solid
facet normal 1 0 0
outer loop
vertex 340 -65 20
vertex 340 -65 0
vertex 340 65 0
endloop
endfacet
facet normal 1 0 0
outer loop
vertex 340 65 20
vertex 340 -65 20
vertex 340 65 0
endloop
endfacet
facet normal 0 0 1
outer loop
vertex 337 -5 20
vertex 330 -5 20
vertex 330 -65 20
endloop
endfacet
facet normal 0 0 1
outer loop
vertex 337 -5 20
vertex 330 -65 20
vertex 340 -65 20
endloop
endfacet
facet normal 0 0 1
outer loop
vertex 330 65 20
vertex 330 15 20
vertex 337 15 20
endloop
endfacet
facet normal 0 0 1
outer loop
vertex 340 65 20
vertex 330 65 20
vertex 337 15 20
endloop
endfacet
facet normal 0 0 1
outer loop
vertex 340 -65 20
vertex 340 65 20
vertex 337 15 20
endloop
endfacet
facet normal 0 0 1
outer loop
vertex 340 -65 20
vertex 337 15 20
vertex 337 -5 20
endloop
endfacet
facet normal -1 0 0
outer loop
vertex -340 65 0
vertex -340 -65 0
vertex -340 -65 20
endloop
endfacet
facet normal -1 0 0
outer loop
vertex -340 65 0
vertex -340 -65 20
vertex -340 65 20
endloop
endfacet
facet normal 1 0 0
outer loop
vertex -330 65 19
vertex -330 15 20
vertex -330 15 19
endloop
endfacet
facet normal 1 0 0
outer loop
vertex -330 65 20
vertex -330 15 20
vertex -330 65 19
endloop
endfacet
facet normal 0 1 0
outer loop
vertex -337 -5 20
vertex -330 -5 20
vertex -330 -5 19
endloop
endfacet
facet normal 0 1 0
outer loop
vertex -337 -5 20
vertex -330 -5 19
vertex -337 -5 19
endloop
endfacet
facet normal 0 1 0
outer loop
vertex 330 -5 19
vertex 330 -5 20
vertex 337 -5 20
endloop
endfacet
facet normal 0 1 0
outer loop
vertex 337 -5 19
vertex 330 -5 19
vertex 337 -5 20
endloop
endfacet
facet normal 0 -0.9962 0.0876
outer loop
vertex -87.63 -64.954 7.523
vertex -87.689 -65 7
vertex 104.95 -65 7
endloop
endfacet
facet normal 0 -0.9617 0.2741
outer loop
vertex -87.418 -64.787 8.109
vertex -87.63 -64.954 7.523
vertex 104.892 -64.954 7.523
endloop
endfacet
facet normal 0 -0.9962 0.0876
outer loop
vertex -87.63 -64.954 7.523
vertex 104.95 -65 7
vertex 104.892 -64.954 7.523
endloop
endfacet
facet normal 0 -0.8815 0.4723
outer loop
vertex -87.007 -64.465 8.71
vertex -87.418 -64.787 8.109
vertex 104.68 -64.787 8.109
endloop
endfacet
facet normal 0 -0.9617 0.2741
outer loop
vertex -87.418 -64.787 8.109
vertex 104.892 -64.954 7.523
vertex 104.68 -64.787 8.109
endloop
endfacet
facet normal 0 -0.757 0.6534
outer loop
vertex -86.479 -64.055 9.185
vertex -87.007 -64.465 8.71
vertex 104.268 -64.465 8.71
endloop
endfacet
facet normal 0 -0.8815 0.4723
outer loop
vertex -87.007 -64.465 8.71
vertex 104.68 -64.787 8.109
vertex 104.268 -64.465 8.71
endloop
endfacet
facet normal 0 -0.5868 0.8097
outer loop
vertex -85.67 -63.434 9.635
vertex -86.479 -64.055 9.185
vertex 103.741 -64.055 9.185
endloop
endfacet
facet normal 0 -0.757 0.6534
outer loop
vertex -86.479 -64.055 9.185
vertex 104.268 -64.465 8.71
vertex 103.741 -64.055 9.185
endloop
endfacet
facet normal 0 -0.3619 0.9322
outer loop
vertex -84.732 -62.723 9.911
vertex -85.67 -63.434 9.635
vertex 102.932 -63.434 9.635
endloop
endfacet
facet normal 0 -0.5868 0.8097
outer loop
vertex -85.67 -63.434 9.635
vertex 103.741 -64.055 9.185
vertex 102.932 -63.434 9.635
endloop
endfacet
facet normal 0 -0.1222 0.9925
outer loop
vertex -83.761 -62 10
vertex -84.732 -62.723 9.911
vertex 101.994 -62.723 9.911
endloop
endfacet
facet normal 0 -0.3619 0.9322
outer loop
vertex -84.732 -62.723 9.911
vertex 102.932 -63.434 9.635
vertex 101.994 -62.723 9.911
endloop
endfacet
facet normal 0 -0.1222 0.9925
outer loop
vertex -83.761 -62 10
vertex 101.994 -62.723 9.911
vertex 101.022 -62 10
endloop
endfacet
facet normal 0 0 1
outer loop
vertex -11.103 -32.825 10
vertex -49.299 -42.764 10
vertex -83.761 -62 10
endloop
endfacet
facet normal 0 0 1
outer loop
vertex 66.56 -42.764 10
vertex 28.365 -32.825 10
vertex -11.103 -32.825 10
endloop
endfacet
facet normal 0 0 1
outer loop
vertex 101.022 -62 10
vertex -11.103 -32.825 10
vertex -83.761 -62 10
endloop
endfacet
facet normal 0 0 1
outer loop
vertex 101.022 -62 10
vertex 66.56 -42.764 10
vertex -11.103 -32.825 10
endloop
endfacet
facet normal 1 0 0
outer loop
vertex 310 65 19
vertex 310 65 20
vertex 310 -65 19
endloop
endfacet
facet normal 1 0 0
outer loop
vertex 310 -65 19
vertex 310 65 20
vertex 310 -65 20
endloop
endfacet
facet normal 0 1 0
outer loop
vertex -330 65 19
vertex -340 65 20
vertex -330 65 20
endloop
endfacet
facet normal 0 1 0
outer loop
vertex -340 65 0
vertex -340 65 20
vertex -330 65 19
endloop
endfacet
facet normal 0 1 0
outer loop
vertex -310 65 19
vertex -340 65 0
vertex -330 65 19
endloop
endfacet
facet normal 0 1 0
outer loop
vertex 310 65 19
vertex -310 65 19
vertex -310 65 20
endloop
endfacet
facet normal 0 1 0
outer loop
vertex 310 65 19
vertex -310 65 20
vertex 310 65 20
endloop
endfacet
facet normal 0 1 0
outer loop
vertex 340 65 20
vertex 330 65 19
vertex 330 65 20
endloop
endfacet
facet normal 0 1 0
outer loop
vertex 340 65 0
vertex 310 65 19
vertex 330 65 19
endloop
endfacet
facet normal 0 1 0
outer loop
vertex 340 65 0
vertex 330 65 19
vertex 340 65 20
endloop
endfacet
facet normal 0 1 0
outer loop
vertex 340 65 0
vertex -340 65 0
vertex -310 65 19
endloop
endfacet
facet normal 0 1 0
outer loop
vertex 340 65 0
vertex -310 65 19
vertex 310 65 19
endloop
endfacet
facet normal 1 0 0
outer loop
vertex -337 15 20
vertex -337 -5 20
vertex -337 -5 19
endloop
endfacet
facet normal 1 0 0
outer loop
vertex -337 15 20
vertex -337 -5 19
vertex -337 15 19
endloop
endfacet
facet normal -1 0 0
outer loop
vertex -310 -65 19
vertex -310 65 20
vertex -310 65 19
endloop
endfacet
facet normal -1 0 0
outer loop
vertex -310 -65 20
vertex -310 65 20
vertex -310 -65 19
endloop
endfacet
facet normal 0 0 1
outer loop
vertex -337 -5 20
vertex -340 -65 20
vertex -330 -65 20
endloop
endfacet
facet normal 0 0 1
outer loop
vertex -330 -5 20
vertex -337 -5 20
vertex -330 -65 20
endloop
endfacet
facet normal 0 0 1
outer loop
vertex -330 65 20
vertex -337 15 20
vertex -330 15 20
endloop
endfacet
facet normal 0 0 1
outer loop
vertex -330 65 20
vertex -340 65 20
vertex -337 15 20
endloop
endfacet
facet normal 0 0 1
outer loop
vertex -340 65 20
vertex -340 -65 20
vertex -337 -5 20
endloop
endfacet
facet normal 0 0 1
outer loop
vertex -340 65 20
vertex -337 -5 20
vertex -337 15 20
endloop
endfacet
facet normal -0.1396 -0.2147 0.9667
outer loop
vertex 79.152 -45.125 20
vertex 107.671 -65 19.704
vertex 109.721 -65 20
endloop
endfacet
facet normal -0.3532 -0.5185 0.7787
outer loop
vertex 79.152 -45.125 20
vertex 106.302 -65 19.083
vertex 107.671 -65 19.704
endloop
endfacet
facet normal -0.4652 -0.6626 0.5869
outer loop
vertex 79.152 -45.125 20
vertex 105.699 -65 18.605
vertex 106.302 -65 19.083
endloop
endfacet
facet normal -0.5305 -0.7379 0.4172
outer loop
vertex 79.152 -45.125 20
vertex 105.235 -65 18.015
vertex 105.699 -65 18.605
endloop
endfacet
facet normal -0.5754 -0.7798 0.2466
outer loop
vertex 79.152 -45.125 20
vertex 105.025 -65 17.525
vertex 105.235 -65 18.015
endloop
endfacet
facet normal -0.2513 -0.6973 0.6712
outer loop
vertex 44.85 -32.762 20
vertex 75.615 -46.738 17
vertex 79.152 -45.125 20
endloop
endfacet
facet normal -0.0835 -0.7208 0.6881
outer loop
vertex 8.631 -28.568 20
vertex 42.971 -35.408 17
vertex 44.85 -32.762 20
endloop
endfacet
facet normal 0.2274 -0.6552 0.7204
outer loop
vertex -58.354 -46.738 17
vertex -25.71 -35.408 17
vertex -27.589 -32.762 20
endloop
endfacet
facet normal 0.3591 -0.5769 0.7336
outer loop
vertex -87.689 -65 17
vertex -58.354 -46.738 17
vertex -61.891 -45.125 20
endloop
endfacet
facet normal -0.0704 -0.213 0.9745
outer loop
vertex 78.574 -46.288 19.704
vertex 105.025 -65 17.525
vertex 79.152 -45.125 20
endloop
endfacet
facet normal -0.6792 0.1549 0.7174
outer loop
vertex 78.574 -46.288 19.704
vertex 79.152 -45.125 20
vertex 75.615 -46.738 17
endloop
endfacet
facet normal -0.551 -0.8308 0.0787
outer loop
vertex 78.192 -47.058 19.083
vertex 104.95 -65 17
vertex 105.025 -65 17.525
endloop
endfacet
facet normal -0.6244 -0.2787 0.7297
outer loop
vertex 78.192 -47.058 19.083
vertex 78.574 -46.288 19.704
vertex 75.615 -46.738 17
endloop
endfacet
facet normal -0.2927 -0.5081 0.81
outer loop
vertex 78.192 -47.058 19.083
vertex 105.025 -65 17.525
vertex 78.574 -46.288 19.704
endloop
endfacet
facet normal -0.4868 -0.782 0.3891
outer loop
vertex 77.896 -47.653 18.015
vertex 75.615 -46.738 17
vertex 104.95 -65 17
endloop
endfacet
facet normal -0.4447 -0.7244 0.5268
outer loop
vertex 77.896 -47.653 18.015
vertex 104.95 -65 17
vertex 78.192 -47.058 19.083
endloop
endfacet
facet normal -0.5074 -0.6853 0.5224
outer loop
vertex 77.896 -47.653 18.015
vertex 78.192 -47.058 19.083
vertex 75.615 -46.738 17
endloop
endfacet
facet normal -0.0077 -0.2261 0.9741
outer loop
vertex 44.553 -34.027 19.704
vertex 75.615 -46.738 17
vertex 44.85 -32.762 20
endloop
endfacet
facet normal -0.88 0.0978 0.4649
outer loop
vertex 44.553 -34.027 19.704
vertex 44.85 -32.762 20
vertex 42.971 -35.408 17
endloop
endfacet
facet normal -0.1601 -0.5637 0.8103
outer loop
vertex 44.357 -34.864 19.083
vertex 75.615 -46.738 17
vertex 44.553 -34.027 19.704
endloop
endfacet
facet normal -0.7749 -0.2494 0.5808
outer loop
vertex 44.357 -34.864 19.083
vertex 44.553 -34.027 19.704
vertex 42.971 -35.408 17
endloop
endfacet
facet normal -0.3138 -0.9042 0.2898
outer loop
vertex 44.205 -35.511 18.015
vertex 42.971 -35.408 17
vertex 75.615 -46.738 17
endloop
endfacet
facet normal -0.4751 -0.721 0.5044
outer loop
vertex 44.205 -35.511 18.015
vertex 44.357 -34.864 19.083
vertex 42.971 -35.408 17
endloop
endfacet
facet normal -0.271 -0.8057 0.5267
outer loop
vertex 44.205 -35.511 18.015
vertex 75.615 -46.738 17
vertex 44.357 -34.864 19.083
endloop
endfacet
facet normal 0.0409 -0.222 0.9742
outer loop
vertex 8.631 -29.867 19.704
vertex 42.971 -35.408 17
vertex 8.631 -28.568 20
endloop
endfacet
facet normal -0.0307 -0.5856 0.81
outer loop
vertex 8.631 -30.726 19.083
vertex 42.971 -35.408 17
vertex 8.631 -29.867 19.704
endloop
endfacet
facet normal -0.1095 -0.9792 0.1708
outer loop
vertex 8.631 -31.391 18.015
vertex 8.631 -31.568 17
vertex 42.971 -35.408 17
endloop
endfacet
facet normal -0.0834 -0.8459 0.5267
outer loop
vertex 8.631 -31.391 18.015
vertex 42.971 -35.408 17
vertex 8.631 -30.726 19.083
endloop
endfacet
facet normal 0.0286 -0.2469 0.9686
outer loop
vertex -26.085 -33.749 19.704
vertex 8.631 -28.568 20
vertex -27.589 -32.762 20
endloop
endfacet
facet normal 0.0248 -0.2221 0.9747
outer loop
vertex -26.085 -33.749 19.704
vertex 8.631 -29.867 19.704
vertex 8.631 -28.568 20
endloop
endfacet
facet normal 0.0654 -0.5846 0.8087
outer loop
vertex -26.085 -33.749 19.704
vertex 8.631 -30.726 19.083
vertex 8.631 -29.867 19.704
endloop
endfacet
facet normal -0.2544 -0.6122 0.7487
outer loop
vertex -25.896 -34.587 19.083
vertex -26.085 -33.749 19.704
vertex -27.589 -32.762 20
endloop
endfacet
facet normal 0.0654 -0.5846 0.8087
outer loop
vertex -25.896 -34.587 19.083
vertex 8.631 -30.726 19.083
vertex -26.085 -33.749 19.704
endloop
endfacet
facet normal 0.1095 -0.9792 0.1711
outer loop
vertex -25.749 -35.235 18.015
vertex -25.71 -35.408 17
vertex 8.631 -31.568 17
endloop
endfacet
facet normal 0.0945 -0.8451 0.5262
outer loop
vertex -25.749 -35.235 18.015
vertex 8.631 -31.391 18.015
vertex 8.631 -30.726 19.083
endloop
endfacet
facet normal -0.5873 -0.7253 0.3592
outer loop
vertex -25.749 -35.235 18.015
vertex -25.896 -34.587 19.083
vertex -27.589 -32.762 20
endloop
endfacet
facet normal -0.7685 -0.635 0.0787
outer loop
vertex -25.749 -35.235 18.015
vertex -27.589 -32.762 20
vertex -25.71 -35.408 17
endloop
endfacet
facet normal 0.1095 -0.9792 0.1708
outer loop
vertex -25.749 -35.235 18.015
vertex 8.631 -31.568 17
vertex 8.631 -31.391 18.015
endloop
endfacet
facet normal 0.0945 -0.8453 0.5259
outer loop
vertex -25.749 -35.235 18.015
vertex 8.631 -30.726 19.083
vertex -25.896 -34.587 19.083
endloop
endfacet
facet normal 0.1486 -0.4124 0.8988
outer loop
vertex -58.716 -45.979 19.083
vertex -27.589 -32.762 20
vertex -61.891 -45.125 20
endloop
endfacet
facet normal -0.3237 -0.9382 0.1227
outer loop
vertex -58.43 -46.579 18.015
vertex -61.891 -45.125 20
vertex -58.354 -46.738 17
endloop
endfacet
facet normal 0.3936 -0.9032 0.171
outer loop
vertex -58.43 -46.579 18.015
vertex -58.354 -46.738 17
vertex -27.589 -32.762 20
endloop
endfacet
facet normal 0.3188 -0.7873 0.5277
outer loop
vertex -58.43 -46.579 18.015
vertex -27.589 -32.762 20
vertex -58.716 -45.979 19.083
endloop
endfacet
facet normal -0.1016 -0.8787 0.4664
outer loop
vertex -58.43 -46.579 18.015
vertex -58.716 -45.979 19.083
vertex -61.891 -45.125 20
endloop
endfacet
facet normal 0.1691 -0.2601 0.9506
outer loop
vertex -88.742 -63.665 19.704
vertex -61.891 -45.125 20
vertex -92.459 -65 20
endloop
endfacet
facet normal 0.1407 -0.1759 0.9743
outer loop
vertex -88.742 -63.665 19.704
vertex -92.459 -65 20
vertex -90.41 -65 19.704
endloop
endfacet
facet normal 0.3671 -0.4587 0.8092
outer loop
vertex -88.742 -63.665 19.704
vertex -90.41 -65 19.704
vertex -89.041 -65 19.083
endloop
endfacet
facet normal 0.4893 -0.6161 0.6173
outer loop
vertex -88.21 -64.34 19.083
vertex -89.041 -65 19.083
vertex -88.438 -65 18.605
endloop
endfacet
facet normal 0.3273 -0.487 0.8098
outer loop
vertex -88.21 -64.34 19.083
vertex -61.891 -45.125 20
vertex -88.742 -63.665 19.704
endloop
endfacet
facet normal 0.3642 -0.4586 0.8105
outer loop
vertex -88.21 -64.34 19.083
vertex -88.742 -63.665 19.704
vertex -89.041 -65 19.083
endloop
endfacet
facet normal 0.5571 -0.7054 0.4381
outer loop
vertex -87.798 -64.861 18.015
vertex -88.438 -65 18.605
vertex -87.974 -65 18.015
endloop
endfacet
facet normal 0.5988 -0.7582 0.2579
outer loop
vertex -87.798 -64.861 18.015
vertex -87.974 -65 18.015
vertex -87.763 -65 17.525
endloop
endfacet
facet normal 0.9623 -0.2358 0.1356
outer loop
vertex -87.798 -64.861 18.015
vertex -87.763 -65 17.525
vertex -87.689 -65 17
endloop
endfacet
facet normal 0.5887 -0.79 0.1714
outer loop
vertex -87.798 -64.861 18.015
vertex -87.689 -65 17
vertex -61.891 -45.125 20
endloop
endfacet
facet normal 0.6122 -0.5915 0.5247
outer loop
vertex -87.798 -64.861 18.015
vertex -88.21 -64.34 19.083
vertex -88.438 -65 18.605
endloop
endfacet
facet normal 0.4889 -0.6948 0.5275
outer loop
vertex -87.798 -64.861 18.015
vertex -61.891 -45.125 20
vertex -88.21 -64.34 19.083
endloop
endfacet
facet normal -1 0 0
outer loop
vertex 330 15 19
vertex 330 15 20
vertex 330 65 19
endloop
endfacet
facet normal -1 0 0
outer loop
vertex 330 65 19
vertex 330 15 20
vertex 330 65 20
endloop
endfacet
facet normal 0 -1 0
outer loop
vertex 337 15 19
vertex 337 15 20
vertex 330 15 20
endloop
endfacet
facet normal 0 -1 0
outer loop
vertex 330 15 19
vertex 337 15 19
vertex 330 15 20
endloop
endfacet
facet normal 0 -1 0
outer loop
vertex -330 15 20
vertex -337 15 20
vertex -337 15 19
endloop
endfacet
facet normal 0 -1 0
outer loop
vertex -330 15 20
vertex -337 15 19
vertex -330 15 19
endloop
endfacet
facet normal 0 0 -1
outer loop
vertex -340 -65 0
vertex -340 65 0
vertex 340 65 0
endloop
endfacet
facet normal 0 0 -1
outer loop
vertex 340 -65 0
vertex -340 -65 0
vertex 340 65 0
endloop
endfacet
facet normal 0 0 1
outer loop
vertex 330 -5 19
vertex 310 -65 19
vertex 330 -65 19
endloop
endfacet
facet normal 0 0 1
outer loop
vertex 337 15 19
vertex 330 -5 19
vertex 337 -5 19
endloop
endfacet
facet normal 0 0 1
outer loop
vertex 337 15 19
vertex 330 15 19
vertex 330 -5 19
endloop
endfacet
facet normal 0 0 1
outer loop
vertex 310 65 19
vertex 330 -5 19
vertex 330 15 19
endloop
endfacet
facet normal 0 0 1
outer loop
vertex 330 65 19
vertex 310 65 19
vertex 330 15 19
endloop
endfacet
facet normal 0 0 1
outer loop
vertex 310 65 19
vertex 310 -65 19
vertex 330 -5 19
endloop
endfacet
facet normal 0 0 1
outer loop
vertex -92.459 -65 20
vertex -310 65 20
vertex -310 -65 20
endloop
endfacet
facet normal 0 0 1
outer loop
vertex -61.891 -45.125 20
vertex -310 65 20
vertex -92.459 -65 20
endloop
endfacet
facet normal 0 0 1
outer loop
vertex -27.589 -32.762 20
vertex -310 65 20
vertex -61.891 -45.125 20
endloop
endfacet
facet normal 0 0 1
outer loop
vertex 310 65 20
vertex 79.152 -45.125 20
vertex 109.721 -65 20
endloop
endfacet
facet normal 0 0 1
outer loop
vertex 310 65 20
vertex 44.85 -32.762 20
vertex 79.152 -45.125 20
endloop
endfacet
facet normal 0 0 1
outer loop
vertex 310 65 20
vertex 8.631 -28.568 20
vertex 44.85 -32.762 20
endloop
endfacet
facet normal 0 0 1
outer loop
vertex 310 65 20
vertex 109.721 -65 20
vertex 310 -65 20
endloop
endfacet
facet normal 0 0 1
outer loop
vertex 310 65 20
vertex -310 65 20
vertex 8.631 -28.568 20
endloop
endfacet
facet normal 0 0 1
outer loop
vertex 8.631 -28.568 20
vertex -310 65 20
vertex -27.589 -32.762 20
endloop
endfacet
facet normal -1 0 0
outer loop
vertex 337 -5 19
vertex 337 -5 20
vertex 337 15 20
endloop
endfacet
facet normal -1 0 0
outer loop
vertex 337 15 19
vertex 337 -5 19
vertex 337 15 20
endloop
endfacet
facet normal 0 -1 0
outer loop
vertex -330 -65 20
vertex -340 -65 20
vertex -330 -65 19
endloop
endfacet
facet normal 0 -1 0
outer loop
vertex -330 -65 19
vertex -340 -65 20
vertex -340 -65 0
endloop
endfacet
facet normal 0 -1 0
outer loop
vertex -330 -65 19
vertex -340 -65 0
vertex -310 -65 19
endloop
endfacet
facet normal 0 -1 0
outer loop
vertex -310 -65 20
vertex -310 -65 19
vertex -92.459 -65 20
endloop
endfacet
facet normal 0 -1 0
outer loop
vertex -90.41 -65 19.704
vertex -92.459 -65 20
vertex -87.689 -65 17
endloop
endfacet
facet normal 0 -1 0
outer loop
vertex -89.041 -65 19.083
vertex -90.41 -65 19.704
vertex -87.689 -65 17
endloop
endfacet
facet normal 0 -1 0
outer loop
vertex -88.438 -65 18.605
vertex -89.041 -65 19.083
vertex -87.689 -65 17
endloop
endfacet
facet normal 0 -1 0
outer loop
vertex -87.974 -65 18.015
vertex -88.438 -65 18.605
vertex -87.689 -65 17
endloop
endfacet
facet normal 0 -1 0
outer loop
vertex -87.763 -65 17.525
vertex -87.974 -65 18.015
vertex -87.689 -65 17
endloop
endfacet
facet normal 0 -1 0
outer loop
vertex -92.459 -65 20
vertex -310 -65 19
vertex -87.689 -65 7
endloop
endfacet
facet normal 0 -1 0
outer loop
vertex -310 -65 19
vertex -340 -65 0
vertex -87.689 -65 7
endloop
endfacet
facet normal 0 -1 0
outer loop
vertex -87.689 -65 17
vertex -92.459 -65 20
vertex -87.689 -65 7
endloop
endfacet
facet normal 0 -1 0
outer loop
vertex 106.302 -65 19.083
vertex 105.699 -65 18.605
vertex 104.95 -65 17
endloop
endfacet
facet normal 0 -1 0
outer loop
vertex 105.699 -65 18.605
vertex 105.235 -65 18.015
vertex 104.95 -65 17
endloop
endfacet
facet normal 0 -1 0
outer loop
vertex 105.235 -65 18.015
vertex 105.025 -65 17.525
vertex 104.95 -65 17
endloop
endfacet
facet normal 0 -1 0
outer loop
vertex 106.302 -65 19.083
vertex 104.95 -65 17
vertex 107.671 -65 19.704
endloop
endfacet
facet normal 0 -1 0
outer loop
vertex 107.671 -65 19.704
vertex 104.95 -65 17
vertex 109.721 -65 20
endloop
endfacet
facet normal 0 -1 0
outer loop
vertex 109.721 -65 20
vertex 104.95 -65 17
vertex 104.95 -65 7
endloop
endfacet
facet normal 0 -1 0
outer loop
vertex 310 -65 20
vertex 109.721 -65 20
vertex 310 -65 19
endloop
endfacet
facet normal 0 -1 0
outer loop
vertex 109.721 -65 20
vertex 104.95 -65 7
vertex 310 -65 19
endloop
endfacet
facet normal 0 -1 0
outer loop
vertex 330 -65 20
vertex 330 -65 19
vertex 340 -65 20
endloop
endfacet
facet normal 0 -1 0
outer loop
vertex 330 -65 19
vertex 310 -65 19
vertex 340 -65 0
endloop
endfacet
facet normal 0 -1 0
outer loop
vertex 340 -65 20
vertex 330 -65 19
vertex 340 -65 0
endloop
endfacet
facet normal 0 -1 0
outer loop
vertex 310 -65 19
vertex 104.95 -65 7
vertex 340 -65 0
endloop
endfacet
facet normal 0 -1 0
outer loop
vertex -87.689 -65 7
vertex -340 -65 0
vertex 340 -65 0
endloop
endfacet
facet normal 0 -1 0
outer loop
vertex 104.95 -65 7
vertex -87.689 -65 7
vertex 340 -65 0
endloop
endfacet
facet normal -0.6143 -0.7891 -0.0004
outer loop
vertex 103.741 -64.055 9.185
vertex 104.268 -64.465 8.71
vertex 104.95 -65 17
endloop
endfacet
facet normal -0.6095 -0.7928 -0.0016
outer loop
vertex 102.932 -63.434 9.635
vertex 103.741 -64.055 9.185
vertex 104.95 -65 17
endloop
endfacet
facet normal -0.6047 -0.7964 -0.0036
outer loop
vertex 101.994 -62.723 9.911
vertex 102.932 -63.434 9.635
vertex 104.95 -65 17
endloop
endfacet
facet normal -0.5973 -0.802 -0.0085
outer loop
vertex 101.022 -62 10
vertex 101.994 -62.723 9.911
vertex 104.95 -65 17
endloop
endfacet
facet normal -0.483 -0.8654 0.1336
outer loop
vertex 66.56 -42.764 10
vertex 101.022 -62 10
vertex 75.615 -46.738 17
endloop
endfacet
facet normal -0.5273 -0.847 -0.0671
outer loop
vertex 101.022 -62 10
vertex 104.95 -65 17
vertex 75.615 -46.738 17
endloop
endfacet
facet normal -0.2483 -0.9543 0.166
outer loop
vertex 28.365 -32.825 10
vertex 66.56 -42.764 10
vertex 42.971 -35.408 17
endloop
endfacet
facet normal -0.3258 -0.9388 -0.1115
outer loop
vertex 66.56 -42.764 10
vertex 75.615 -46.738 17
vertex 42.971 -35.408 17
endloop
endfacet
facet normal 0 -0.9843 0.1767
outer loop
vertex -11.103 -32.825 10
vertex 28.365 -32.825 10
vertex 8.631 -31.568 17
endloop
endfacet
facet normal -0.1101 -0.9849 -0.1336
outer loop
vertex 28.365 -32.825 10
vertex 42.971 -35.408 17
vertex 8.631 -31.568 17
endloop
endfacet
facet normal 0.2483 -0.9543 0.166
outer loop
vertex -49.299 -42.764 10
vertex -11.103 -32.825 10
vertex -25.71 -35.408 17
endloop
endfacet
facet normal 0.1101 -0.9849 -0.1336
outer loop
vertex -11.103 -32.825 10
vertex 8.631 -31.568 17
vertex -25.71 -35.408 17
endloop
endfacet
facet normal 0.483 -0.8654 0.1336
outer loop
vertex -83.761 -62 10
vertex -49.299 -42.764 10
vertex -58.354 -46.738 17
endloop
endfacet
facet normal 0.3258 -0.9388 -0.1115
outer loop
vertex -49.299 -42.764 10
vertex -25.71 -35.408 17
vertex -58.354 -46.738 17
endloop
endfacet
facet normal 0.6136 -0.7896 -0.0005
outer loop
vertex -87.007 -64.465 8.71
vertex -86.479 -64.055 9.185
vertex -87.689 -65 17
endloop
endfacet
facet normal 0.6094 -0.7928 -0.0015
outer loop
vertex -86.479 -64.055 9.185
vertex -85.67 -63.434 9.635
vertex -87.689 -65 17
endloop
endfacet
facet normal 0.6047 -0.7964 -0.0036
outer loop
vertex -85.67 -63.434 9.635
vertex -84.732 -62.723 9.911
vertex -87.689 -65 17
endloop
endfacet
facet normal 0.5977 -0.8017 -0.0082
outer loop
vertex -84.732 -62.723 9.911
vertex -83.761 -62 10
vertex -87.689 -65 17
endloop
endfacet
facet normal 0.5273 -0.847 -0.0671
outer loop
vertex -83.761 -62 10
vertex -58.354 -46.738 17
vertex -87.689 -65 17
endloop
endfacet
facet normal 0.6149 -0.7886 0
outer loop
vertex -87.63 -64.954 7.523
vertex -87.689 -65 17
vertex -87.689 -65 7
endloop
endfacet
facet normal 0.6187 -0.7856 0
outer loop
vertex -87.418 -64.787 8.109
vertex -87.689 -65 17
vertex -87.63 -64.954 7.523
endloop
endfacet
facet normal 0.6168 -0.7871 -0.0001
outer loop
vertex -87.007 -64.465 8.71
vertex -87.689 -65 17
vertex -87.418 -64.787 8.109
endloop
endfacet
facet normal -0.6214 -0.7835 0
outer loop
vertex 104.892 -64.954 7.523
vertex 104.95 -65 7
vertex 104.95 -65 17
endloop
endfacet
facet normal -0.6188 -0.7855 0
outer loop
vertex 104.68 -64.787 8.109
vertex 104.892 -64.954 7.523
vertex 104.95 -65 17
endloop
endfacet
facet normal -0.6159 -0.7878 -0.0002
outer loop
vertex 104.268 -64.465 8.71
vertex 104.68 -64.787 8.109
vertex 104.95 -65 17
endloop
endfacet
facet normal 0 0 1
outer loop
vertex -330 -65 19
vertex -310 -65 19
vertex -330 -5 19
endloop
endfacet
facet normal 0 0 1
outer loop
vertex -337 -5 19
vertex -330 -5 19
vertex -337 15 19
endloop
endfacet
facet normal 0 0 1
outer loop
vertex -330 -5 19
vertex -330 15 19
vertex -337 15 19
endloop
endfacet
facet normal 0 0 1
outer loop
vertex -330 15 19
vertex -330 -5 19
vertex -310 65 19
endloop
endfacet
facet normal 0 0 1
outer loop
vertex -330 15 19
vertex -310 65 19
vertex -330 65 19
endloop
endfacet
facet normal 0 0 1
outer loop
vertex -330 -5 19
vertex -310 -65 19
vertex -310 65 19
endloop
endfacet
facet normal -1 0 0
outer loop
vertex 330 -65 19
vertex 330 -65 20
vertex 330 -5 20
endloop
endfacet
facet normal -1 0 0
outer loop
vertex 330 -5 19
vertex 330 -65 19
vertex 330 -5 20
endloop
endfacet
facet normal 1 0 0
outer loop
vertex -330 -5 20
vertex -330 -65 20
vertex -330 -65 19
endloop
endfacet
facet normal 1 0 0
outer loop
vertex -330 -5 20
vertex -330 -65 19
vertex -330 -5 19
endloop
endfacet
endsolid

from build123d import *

# Parameters (mm, degrees)
CROQUIS1_W              = 680
CROQUIS1_H              = 130
SALIENTE_EXTRUIR1_DEPTH = 20
CORTAR_EXTRUIR6_DEPTH   = 10
REDONDEO6_R             = 3
REDONDEO7_R             = 3
CORTAR_EXTRUIR9_DEPTH   = 1
CORTAR_EXTRUIR10_DEPTH  = 1


with BuildPart() as part:
    # Croquis1 → Saliente-Extruir1 (new body)
    with BuildSketch(Plane.XY):
        Rectangle(CROQUIS1_W, CROQUIS1_H)
    extrude(amount=SALIENTE_EXTRUIR1_DEPTH)

    # Croquis4 → Cortar-Extruir6 (cut)
    with BuildSketch(Plane.XY.offset(20)):
        with BuildLine():
            Line((-87.688515054, -65), (104.950033766, -65))
            ThreePointArc((104.950033766, -65), (8.630759356, -31.56754978), (-87.688515054, -65))
        make_face()
    extrude(amount=-CORTAR_EXTRUIR6_DEPTH, mode=Mode.SUBTRACT)

    # Redondeo6
    redondeo6_edges = [part.edges().sort_by_distance(p)[0] for p in [
        (8.630759356, -31.56754978, 20),
    ]]
    fillet(redondeo6_edges, radius=REDONDEO6_R)

    # Redondeo7
    redondeo7_edges = [part.edges().sort_by_distance(p)[0] for p in [
        (8.630759356, -65, 10),
    ]]
    fillet(redondeo7_edges, radius=REDONDEO7_R)

    # Croquis5 → Cortar-Extruir9 (cut)
    with BuildSketch(Plane.XY.offset(20)):
        Polygon((310, 65), (310, -65), (330, -65), (330, -5), (337, -5), (337, 15), (330, 15), (330, 65), align=None)
    extrude(amount=-CORTAR_EXTRUIR9_DEPTH, mode=Mode.SUBTRACT)

    # Croquis6 → Cortar-Extruir10 (cut)
    with BuildSketch(Plane.XY.offset(20)):
        Polygon((-310, 65), (-310, -65), (-330, -65), (-330, -5), (-337, -5), (-337, 15), (-330, 15), (-330, 65), align=None)
    extrude(amount=-CORTAR_EXTRUIR10_DEPTH, mode=Mode.SUBTRACT)


solid = part.part
